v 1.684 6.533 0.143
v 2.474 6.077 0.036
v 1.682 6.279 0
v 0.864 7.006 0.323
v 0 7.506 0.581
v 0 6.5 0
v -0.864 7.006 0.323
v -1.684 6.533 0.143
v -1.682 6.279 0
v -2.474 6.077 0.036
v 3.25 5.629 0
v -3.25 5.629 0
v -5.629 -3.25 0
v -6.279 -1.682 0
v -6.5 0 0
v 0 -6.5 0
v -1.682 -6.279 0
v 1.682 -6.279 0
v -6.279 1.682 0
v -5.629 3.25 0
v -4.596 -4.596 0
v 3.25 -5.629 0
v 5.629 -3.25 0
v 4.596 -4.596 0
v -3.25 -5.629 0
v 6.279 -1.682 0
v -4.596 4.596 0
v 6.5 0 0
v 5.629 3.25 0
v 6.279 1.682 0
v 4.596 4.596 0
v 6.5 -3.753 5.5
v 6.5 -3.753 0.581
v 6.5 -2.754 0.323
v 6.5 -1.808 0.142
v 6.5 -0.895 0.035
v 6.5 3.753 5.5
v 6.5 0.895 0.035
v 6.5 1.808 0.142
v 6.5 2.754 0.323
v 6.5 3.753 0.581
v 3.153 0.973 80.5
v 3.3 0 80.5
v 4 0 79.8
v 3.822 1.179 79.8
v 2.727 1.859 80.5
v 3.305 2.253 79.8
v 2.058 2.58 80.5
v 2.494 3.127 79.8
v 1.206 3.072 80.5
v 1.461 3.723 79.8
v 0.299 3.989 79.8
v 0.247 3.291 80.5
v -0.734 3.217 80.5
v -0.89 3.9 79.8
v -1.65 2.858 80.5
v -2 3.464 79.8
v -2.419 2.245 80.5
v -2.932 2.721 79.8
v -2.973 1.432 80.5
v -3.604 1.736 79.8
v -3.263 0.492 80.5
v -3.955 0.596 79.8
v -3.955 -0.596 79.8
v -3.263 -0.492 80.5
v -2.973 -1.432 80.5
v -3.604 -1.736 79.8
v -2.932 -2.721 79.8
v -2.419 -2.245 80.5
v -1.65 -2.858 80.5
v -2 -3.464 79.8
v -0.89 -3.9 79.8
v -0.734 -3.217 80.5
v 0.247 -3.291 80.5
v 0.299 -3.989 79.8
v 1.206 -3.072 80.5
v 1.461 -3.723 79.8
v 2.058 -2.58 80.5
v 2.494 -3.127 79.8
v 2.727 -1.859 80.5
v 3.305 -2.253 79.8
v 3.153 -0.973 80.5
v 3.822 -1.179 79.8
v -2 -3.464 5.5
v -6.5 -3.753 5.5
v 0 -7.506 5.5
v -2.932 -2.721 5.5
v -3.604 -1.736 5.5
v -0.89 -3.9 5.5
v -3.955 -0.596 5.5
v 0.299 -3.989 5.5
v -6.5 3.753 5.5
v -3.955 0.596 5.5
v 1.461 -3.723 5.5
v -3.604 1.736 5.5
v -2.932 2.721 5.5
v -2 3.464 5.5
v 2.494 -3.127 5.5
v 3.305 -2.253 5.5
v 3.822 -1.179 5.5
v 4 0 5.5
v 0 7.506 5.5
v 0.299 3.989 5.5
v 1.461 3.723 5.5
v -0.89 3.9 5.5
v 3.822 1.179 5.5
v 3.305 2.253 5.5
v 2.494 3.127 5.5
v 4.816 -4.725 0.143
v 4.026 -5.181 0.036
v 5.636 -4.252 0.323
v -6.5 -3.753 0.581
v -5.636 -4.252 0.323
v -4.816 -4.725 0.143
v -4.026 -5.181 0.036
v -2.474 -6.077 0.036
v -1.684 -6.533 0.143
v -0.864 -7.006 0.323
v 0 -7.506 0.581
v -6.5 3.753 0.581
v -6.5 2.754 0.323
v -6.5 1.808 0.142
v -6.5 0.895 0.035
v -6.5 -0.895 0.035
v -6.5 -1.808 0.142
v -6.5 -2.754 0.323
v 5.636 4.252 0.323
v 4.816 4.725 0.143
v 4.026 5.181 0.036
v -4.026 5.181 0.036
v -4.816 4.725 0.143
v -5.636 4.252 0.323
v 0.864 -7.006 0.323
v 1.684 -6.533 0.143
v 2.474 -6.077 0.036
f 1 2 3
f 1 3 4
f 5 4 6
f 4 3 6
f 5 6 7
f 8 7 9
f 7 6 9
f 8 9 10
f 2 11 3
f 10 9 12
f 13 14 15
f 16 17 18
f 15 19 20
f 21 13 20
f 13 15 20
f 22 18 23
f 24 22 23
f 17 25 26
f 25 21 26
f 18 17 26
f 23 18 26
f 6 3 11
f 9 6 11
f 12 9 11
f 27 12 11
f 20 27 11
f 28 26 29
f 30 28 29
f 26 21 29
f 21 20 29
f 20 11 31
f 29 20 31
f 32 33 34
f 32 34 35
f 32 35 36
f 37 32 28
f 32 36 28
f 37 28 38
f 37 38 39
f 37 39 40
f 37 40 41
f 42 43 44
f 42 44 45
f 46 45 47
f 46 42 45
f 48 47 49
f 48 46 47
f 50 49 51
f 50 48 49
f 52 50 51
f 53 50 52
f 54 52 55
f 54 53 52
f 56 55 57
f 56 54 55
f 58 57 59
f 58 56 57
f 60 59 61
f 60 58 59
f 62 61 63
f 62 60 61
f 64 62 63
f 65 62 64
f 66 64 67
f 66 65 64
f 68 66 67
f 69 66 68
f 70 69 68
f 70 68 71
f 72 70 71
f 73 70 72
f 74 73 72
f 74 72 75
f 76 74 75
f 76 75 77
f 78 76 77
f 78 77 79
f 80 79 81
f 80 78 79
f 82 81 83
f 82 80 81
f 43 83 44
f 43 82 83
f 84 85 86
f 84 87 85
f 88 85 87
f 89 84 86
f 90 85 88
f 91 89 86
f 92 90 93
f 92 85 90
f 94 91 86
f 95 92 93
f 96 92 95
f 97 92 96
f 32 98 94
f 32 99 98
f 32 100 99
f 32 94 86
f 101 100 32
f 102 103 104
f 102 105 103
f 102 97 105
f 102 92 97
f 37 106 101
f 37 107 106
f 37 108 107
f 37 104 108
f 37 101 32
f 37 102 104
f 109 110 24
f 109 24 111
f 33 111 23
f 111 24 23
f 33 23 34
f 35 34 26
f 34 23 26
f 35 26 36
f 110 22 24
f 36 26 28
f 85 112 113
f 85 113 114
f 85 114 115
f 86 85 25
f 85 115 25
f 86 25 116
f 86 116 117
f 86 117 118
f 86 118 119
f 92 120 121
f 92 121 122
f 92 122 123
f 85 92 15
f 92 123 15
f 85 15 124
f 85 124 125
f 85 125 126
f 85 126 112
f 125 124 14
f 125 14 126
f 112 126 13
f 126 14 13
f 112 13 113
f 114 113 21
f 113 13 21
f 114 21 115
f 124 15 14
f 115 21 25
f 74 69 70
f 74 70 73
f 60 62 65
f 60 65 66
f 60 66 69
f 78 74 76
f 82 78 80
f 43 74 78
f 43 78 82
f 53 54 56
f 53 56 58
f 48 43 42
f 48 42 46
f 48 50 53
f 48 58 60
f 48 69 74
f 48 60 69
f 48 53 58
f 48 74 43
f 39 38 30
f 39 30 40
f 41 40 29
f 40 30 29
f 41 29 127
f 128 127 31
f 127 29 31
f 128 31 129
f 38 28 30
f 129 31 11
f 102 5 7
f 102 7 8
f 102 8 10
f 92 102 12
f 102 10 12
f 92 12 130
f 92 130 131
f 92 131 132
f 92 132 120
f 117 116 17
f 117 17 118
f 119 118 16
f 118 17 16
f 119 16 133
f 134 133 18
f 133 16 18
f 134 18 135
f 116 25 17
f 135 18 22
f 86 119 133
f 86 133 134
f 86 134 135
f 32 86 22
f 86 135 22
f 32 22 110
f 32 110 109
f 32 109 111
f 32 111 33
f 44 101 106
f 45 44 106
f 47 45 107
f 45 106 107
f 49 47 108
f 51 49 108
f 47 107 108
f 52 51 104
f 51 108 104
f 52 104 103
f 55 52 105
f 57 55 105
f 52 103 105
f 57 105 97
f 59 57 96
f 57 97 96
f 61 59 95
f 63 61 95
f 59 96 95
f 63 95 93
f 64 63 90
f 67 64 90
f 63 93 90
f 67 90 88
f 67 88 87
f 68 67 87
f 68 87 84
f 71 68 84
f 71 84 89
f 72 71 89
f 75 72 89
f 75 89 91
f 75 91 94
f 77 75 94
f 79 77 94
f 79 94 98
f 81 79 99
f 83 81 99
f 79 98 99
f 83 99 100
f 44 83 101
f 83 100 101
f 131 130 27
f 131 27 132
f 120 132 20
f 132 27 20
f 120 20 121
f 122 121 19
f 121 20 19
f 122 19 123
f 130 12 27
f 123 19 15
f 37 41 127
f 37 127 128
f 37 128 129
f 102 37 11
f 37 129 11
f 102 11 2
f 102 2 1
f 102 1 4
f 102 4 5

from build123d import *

# Parameters (mm, degrees)
F1_DEPTH = 5.5
F2_R     = 4
F3_DEPTH = 75
F6_SIZE  = 0.7


with BuildPart() as f1:
    # F0 (on Top) → F1 (new body)
    with BuildSketch(Plane.XY):
        Polygon((0, -7.505553), (6.5, -3.752777), (6.5, 3.752777), (0, 7.505553), (-6.5, 3.752777), (-6.5, -3.752777), align=None)
    extrude(amount=F1_DEPTH)

    # F2 (on face) → F3 (join)
    with BuildSketch(Plane.XY.offset(5.5)):
        Circle(F2_R)
    extrude(amount=F3_DEPTH)

    # F4 (on Front) → F5 (revolve, cut)
    with BuildSketch(Plane.XZ):
        Polygon((11.157986, 2.68929), (6.5, 0), (11.157986, 0), align=None)
    revolve(axis=Axis((0, 0, 4.89242), (0, 0, 1)), mode=Mode.SUBTRACT)

    # F6
    f6_edges = [f1.edges().sort_by_distance(p)[0] for p in [
        (-4, 0, 80.5),
    ]]
    chamfer(f6_edges, length=F6_SIZE)


solid = f1.part
